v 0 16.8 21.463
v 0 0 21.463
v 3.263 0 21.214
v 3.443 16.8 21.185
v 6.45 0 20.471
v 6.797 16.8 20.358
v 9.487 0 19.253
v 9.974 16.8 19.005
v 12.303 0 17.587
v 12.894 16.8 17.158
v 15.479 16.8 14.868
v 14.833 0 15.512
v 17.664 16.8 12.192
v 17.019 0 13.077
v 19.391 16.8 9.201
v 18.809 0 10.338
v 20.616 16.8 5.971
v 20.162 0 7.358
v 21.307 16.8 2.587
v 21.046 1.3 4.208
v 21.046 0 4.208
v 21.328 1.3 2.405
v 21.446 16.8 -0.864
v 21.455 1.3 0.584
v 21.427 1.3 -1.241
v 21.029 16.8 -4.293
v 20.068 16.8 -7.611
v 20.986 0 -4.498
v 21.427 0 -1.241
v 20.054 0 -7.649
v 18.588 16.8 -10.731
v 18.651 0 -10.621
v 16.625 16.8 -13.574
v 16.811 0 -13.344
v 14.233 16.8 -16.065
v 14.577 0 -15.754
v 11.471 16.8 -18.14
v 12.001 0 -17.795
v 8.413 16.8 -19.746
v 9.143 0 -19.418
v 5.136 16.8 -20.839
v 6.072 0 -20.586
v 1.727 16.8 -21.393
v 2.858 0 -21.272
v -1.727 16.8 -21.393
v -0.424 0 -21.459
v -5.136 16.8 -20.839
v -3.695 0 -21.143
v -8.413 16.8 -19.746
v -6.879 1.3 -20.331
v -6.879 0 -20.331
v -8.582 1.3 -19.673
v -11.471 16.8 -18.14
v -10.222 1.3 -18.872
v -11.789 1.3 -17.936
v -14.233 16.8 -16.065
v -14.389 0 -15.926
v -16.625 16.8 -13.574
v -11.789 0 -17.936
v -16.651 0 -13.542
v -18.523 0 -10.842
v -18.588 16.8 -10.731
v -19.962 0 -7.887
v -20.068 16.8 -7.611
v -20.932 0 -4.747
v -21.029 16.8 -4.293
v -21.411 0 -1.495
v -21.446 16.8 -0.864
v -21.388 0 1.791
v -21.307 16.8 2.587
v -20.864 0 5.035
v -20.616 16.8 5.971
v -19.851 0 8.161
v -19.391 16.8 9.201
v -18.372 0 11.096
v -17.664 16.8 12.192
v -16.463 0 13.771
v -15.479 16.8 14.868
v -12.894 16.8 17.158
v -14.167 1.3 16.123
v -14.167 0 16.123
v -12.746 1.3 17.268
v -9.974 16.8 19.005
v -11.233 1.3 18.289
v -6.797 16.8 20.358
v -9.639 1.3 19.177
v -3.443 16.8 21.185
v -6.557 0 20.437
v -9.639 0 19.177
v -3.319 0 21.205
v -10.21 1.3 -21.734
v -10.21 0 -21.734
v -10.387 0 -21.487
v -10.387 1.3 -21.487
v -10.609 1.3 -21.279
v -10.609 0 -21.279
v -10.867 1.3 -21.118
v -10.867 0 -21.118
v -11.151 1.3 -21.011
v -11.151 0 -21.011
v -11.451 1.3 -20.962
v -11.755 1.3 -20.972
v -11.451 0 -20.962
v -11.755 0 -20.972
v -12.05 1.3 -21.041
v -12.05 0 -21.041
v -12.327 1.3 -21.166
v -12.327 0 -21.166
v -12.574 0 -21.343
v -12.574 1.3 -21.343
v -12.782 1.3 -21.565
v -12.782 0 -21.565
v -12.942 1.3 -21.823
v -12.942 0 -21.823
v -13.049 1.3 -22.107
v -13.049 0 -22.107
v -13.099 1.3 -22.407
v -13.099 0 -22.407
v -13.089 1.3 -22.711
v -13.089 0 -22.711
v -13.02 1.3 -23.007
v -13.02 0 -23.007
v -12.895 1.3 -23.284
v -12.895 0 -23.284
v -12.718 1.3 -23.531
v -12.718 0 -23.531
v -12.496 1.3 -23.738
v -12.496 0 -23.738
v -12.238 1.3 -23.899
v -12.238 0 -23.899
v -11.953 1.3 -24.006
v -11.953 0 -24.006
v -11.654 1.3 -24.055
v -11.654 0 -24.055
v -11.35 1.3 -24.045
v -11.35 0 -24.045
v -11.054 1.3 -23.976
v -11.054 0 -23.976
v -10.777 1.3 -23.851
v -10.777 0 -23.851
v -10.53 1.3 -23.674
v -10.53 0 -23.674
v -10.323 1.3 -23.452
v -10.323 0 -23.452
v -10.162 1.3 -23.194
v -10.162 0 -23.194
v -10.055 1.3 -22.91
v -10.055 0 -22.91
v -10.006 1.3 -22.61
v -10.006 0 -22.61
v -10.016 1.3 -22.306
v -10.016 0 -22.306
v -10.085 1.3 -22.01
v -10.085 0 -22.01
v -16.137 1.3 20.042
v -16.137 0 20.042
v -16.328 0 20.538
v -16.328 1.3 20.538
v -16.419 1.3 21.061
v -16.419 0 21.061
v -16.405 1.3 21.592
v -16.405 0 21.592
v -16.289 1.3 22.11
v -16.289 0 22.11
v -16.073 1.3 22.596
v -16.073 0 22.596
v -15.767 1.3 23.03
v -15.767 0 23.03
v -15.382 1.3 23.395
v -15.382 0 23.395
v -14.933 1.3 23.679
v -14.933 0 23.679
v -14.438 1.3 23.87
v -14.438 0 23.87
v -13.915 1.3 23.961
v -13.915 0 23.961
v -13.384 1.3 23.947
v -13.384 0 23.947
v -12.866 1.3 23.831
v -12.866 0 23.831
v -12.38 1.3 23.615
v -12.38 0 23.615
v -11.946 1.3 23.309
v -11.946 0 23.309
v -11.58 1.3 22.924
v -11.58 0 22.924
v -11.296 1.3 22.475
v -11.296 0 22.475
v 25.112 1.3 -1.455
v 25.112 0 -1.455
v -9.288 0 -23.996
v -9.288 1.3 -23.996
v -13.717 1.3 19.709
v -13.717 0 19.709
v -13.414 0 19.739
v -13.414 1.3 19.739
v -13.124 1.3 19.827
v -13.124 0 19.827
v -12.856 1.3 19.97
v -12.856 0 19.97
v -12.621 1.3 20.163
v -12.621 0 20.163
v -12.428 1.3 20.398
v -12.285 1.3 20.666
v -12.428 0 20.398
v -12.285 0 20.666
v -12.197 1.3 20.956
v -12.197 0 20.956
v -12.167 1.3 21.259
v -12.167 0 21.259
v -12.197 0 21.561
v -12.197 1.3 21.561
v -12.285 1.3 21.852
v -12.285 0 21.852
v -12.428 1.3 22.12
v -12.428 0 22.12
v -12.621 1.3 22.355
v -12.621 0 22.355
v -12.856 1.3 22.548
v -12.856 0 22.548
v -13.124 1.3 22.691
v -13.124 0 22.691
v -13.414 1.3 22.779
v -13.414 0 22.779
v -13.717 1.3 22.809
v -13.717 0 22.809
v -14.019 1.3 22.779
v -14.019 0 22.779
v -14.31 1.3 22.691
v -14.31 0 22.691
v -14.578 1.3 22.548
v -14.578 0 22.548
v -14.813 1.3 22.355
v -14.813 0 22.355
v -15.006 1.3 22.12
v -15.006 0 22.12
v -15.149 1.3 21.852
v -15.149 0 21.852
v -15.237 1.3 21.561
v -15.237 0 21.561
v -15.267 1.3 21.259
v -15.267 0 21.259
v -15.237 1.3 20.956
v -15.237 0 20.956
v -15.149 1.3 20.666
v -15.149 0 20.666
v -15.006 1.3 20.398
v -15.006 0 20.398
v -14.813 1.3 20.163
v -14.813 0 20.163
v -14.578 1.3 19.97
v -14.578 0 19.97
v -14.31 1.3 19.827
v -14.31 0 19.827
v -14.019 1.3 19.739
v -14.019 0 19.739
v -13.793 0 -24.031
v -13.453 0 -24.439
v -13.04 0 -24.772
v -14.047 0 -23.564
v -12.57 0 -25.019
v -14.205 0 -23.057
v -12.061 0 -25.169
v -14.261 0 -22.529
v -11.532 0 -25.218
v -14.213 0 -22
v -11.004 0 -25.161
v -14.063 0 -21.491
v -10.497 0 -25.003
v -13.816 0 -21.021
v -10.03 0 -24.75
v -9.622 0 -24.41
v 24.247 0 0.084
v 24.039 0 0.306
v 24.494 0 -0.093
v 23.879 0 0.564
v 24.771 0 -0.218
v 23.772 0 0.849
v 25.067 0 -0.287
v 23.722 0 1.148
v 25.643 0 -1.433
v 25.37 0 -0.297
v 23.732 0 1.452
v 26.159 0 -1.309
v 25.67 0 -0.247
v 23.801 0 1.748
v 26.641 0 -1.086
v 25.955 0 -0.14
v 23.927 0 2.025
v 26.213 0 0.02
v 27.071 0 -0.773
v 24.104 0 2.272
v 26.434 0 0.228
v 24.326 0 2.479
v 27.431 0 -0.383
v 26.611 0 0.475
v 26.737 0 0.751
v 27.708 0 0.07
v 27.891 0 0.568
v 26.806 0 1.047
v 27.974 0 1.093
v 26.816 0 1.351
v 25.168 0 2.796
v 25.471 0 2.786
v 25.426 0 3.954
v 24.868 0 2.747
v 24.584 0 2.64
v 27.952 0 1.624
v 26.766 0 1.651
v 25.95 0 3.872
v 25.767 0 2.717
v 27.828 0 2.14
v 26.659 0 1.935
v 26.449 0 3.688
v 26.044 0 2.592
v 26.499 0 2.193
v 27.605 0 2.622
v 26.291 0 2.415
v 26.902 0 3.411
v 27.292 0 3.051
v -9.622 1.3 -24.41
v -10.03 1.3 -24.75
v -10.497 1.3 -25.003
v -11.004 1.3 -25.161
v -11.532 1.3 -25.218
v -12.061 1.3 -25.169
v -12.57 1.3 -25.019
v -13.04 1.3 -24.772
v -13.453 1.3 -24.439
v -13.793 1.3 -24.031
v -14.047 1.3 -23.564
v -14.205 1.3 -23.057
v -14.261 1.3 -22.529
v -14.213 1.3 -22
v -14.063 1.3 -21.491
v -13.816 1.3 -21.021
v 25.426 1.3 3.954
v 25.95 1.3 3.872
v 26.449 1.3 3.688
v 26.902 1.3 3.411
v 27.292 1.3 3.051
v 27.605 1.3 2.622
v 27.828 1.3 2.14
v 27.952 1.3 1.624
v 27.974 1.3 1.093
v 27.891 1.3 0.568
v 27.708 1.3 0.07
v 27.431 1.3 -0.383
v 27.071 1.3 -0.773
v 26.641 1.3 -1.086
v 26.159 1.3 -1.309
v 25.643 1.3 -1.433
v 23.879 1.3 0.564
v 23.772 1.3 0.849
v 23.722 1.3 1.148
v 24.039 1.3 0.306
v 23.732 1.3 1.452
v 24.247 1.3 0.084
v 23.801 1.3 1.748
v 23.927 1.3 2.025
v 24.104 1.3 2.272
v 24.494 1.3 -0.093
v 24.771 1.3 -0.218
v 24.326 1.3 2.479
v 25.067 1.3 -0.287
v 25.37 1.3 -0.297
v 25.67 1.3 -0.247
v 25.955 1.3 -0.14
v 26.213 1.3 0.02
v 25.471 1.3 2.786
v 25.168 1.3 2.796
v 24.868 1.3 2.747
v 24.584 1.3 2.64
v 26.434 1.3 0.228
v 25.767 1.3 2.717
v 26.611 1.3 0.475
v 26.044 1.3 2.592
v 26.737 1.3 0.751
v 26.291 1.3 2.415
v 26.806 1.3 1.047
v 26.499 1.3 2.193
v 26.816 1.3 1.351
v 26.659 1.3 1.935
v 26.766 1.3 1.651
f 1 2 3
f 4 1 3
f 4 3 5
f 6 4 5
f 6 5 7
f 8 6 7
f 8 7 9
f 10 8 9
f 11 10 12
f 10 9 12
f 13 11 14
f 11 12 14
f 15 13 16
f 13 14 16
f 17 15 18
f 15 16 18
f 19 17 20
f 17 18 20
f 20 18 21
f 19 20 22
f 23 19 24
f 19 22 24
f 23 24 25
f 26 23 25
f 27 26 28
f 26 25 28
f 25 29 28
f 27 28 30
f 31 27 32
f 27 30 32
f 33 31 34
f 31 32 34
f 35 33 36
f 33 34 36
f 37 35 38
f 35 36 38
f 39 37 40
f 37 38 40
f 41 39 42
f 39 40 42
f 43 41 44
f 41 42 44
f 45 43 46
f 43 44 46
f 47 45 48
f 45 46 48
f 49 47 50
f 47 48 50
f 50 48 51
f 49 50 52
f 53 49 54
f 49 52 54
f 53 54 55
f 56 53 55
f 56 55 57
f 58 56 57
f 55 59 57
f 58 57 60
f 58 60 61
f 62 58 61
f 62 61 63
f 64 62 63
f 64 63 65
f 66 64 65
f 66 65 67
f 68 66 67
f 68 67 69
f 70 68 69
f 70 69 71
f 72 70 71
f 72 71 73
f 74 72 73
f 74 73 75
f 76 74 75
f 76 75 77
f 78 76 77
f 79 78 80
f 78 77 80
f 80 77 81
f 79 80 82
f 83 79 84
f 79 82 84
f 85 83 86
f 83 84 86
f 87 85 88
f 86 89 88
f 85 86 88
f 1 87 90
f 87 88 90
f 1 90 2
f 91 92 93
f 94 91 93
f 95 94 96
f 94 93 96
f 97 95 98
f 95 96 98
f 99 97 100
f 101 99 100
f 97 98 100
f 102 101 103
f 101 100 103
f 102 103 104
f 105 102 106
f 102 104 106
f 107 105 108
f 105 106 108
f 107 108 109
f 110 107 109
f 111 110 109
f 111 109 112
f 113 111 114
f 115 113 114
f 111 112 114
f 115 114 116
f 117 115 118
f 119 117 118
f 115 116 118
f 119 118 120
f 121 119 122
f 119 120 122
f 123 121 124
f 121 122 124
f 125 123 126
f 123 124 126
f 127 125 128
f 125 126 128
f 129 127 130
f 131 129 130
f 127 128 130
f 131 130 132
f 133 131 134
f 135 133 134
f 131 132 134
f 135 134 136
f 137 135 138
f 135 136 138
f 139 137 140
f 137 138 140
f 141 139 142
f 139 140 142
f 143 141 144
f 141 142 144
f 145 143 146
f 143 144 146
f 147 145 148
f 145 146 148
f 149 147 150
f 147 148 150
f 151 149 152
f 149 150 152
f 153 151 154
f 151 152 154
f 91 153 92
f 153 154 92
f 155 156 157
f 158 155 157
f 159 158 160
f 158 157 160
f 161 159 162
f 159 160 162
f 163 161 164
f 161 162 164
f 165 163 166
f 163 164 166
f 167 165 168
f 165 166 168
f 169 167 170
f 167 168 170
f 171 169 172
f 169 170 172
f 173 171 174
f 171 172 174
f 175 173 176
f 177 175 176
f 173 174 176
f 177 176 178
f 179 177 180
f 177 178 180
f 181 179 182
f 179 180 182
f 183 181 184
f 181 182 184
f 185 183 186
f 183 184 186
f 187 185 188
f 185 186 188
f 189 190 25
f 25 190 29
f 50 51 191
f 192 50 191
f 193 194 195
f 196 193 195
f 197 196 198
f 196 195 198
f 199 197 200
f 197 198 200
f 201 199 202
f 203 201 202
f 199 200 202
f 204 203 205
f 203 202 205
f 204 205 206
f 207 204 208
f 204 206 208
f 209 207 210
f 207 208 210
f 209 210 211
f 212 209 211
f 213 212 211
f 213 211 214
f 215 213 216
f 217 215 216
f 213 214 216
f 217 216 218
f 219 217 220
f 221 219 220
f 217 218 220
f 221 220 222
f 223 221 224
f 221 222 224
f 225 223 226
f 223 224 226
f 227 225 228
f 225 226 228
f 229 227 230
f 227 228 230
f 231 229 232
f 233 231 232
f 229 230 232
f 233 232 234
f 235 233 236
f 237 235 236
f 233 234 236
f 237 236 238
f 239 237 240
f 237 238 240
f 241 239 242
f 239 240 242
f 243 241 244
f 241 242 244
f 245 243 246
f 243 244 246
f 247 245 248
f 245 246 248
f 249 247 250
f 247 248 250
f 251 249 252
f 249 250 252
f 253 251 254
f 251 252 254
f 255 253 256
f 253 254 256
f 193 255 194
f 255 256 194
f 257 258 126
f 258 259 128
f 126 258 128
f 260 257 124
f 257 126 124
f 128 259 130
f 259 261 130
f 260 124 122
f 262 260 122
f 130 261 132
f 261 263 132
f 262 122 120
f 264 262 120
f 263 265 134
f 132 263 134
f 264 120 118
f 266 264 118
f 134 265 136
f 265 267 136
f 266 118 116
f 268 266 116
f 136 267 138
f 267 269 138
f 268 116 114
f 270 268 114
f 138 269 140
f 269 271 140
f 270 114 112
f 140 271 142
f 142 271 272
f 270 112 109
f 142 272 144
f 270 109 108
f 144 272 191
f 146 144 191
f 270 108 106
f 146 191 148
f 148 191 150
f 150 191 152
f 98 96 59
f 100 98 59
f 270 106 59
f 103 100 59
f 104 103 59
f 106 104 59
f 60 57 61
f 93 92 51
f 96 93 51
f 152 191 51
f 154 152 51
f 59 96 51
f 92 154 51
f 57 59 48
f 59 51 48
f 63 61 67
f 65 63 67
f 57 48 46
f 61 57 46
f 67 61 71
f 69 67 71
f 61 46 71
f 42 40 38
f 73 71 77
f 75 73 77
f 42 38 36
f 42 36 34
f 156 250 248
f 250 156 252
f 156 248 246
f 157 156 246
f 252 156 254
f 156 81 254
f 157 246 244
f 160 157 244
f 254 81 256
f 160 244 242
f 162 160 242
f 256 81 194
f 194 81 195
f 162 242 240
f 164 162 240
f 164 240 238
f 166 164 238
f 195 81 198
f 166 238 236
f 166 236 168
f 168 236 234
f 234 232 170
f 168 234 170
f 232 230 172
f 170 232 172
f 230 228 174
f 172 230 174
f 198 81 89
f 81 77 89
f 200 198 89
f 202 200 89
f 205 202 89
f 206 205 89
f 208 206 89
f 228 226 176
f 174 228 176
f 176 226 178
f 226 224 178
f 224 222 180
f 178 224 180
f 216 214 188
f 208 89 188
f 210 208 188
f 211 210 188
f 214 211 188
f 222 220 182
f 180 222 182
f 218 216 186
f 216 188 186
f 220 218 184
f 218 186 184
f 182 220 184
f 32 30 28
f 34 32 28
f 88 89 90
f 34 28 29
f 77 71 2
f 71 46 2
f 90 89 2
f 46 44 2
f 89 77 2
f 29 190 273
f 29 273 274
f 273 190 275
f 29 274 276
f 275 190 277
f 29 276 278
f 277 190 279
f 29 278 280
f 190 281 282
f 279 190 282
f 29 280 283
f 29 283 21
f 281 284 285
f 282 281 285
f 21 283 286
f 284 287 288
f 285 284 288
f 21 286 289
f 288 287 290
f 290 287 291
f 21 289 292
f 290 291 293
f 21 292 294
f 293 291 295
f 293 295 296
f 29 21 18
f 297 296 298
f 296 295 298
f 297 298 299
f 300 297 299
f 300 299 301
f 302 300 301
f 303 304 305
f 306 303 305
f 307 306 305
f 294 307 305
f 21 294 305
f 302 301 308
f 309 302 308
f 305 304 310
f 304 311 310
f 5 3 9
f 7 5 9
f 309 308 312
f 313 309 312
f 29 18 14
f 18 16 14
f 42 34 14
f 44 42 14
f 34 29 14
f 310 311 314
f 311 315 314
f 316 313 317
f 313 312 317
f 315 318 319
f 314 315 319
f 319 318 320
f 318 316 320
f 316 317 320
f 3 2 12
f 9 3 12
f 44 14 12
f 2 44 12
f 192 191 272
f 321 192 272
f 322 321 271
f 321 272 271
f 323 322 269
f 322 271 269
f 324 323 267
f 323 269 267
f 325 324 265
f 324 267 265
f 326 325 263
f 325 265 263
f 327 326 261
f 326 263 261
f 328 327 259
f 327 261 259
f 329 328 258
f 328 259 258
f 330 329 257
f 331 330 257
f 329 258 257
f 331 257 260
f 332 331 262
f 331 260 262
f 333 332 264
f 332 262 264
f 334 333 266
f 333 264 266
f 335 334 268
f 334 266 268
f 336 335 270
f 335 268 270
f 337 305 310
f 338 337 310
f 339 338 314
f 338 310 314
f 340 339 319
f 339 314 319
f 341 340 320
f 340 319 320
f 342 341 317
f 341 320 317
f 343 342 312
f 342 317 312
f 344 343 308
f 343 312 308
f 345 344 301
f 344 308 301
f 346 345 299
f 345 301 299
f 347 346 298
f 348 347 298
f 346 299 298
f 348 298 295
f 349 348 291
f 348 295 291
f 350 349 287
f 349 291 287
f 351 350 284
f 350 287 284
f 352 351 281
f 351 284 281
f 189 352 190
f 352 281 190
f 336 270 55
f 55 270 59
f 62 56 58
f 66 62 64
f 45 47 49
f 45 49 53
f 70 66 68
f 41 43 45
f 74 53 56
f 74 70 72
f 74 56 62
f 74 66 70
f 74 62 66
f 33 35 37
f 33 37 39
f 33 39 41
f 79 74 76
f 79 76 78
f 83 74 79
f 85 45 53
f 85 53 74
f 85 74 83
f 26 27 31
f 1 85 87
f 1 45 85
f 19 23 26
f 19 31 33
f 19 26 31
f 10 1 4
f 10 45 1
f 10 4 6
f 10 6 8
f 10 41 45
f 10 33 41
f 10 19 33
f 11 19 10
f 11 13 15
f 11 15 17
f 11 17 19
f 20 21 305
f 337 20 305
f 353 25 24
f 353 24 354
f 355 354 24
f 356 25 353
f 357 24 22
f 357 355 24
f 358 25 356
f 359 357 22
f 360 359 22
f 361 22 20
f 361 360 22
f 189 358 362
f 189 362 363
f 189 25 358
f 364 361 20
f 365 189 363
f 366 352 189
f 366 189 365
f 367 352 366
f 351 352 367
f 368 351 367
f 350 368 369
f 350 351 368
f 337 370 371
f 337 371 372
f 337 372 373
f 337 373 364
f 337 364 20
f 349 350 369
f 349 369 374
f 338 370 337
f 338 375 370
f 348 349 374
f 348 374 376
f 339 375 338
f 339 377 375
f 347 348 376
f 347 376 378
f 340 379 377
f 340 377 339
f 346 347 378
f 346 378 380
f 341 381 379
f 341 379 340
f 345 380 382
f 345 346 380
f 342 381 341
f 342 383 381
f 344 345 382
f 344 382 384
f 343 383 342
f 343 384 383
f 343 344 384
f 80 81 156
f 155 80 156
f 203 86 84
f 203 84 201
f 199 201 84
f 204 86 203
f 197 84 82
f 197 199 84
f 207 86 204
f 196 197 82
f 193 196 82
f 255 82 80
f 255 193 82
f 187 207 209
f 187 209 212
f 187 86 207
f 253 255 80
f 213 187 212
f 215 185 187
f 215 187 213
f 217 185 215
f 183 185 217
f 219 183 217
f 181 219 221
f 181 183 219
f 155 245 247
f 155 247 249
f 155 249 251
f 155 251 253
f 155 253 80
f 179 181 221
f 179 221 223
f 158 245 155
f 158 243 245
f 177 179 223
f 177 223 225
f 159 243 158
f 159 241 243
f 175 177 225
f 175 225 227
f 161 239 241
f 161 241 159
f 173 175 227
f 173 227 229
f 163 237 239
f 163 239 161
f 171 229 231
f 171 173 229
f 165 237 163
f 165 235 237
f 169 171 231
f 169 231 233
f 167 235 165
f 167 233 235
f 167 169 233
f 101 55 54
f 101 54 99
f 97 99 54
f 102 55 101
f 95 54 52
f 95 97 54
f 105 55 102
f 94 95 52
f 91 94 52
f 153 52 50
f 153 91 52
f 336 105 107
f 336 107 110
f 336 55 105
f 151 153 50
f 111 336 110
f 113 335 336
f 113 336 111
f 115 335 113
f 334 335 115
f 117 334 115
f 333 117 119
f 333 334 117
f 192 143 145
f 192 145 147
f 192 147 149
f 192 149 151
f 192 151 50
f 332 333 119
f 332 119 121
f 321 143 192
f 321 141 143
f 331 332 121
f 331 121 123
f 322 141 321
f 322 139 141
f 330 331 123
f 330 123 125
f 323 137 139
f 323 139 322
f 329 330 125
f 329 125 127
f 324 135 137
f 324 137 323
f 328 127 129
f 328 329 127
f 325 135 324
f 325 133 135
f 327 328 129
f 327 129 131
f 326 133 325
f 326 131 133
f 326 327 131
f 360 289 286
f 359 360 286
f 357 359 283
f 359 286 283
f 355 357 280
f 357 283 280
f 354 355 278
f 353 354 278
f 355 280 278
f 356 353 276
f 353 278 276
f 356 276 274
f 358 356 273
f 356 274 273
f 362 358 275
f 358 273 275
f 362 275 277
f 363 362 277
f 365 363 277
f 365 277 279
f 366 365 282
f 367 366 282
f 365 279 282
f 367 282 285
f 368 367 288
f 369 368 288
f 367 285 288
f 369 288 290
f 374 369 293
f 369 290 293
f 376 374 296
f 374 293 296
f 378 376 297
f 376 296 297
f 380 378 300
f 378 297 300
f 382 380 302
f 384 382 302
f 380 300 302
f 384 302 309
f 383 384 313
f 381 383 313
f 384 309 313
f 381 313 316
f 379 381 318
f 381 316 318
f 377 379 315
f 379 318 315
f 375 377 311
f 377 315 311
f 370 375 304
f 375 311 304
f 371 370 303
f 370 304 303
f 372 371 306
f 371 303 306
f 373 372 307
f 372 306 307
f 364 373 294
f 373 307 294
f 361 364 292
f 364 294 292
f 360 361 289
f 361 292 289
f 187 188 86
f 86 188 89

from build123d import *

# Parameters (mm, degrees)
SKETCH1_R           = 21.463
BOSS_EXTRUDE1_DEPTH = 16.8
SKETCH2_R           = 1.55
BOSS_EXTRUDE2_DEPTH = 1.3
CIRPATTERN1_COUNT   = 3


with BuildPart() as part:
    # Sketch1 → Boss-Extrude1 (new body)
    with BuildSketch(Plane(origin=(0, 0, 0), x_dir=(1, 0, 0), z_dir=(0, 1, 0))):
        Circle(SKETCH1_R)
    extrude(amount=BOSS_EXTRUDE1_DEPTH)

    # Sketch2 → Boss-Extrude2 (add)
    with BuildSketch(Plane.XZ):
        with BuildLine():
            Line((-14.167399247, 16.122815126), (-16.137353009, 20.042265188))
            ThreePointArc((-16.137353009, 20.042265188), (-14.933420138, 23.679331264), (-11.296354062, 22.475398393))
            Line((-11.296354062, 22.475398393), (-9.63856212, 19.177030251))
            ThreePointArc((-9.63856212, 19.177030251), (-12.000541932, 17.794588007), (-14.167399247, 16.122815126))
        make_face()
        with Locations((-13.716853536, 21.25883179)):
            Circle(SKETCH2_R, mode=Mode.SUBTRACT)
    boss_extrude2 = extrude(amount=-BOSS_EXTRUDE2_DEPTH)

    # CirPattern1: Boss-Extrude2 ×3 about axis
    cirpattern1_axis = Axis((0, 17.64, 0), (0, -1, 0))
    for i in range(1, CIRPATTERN1_COUNT):
        add(boss_extrude2.rotate(cirpattern1_axis, i * 360 / CIRPATTERN1_COUNT))


solid = part.part
